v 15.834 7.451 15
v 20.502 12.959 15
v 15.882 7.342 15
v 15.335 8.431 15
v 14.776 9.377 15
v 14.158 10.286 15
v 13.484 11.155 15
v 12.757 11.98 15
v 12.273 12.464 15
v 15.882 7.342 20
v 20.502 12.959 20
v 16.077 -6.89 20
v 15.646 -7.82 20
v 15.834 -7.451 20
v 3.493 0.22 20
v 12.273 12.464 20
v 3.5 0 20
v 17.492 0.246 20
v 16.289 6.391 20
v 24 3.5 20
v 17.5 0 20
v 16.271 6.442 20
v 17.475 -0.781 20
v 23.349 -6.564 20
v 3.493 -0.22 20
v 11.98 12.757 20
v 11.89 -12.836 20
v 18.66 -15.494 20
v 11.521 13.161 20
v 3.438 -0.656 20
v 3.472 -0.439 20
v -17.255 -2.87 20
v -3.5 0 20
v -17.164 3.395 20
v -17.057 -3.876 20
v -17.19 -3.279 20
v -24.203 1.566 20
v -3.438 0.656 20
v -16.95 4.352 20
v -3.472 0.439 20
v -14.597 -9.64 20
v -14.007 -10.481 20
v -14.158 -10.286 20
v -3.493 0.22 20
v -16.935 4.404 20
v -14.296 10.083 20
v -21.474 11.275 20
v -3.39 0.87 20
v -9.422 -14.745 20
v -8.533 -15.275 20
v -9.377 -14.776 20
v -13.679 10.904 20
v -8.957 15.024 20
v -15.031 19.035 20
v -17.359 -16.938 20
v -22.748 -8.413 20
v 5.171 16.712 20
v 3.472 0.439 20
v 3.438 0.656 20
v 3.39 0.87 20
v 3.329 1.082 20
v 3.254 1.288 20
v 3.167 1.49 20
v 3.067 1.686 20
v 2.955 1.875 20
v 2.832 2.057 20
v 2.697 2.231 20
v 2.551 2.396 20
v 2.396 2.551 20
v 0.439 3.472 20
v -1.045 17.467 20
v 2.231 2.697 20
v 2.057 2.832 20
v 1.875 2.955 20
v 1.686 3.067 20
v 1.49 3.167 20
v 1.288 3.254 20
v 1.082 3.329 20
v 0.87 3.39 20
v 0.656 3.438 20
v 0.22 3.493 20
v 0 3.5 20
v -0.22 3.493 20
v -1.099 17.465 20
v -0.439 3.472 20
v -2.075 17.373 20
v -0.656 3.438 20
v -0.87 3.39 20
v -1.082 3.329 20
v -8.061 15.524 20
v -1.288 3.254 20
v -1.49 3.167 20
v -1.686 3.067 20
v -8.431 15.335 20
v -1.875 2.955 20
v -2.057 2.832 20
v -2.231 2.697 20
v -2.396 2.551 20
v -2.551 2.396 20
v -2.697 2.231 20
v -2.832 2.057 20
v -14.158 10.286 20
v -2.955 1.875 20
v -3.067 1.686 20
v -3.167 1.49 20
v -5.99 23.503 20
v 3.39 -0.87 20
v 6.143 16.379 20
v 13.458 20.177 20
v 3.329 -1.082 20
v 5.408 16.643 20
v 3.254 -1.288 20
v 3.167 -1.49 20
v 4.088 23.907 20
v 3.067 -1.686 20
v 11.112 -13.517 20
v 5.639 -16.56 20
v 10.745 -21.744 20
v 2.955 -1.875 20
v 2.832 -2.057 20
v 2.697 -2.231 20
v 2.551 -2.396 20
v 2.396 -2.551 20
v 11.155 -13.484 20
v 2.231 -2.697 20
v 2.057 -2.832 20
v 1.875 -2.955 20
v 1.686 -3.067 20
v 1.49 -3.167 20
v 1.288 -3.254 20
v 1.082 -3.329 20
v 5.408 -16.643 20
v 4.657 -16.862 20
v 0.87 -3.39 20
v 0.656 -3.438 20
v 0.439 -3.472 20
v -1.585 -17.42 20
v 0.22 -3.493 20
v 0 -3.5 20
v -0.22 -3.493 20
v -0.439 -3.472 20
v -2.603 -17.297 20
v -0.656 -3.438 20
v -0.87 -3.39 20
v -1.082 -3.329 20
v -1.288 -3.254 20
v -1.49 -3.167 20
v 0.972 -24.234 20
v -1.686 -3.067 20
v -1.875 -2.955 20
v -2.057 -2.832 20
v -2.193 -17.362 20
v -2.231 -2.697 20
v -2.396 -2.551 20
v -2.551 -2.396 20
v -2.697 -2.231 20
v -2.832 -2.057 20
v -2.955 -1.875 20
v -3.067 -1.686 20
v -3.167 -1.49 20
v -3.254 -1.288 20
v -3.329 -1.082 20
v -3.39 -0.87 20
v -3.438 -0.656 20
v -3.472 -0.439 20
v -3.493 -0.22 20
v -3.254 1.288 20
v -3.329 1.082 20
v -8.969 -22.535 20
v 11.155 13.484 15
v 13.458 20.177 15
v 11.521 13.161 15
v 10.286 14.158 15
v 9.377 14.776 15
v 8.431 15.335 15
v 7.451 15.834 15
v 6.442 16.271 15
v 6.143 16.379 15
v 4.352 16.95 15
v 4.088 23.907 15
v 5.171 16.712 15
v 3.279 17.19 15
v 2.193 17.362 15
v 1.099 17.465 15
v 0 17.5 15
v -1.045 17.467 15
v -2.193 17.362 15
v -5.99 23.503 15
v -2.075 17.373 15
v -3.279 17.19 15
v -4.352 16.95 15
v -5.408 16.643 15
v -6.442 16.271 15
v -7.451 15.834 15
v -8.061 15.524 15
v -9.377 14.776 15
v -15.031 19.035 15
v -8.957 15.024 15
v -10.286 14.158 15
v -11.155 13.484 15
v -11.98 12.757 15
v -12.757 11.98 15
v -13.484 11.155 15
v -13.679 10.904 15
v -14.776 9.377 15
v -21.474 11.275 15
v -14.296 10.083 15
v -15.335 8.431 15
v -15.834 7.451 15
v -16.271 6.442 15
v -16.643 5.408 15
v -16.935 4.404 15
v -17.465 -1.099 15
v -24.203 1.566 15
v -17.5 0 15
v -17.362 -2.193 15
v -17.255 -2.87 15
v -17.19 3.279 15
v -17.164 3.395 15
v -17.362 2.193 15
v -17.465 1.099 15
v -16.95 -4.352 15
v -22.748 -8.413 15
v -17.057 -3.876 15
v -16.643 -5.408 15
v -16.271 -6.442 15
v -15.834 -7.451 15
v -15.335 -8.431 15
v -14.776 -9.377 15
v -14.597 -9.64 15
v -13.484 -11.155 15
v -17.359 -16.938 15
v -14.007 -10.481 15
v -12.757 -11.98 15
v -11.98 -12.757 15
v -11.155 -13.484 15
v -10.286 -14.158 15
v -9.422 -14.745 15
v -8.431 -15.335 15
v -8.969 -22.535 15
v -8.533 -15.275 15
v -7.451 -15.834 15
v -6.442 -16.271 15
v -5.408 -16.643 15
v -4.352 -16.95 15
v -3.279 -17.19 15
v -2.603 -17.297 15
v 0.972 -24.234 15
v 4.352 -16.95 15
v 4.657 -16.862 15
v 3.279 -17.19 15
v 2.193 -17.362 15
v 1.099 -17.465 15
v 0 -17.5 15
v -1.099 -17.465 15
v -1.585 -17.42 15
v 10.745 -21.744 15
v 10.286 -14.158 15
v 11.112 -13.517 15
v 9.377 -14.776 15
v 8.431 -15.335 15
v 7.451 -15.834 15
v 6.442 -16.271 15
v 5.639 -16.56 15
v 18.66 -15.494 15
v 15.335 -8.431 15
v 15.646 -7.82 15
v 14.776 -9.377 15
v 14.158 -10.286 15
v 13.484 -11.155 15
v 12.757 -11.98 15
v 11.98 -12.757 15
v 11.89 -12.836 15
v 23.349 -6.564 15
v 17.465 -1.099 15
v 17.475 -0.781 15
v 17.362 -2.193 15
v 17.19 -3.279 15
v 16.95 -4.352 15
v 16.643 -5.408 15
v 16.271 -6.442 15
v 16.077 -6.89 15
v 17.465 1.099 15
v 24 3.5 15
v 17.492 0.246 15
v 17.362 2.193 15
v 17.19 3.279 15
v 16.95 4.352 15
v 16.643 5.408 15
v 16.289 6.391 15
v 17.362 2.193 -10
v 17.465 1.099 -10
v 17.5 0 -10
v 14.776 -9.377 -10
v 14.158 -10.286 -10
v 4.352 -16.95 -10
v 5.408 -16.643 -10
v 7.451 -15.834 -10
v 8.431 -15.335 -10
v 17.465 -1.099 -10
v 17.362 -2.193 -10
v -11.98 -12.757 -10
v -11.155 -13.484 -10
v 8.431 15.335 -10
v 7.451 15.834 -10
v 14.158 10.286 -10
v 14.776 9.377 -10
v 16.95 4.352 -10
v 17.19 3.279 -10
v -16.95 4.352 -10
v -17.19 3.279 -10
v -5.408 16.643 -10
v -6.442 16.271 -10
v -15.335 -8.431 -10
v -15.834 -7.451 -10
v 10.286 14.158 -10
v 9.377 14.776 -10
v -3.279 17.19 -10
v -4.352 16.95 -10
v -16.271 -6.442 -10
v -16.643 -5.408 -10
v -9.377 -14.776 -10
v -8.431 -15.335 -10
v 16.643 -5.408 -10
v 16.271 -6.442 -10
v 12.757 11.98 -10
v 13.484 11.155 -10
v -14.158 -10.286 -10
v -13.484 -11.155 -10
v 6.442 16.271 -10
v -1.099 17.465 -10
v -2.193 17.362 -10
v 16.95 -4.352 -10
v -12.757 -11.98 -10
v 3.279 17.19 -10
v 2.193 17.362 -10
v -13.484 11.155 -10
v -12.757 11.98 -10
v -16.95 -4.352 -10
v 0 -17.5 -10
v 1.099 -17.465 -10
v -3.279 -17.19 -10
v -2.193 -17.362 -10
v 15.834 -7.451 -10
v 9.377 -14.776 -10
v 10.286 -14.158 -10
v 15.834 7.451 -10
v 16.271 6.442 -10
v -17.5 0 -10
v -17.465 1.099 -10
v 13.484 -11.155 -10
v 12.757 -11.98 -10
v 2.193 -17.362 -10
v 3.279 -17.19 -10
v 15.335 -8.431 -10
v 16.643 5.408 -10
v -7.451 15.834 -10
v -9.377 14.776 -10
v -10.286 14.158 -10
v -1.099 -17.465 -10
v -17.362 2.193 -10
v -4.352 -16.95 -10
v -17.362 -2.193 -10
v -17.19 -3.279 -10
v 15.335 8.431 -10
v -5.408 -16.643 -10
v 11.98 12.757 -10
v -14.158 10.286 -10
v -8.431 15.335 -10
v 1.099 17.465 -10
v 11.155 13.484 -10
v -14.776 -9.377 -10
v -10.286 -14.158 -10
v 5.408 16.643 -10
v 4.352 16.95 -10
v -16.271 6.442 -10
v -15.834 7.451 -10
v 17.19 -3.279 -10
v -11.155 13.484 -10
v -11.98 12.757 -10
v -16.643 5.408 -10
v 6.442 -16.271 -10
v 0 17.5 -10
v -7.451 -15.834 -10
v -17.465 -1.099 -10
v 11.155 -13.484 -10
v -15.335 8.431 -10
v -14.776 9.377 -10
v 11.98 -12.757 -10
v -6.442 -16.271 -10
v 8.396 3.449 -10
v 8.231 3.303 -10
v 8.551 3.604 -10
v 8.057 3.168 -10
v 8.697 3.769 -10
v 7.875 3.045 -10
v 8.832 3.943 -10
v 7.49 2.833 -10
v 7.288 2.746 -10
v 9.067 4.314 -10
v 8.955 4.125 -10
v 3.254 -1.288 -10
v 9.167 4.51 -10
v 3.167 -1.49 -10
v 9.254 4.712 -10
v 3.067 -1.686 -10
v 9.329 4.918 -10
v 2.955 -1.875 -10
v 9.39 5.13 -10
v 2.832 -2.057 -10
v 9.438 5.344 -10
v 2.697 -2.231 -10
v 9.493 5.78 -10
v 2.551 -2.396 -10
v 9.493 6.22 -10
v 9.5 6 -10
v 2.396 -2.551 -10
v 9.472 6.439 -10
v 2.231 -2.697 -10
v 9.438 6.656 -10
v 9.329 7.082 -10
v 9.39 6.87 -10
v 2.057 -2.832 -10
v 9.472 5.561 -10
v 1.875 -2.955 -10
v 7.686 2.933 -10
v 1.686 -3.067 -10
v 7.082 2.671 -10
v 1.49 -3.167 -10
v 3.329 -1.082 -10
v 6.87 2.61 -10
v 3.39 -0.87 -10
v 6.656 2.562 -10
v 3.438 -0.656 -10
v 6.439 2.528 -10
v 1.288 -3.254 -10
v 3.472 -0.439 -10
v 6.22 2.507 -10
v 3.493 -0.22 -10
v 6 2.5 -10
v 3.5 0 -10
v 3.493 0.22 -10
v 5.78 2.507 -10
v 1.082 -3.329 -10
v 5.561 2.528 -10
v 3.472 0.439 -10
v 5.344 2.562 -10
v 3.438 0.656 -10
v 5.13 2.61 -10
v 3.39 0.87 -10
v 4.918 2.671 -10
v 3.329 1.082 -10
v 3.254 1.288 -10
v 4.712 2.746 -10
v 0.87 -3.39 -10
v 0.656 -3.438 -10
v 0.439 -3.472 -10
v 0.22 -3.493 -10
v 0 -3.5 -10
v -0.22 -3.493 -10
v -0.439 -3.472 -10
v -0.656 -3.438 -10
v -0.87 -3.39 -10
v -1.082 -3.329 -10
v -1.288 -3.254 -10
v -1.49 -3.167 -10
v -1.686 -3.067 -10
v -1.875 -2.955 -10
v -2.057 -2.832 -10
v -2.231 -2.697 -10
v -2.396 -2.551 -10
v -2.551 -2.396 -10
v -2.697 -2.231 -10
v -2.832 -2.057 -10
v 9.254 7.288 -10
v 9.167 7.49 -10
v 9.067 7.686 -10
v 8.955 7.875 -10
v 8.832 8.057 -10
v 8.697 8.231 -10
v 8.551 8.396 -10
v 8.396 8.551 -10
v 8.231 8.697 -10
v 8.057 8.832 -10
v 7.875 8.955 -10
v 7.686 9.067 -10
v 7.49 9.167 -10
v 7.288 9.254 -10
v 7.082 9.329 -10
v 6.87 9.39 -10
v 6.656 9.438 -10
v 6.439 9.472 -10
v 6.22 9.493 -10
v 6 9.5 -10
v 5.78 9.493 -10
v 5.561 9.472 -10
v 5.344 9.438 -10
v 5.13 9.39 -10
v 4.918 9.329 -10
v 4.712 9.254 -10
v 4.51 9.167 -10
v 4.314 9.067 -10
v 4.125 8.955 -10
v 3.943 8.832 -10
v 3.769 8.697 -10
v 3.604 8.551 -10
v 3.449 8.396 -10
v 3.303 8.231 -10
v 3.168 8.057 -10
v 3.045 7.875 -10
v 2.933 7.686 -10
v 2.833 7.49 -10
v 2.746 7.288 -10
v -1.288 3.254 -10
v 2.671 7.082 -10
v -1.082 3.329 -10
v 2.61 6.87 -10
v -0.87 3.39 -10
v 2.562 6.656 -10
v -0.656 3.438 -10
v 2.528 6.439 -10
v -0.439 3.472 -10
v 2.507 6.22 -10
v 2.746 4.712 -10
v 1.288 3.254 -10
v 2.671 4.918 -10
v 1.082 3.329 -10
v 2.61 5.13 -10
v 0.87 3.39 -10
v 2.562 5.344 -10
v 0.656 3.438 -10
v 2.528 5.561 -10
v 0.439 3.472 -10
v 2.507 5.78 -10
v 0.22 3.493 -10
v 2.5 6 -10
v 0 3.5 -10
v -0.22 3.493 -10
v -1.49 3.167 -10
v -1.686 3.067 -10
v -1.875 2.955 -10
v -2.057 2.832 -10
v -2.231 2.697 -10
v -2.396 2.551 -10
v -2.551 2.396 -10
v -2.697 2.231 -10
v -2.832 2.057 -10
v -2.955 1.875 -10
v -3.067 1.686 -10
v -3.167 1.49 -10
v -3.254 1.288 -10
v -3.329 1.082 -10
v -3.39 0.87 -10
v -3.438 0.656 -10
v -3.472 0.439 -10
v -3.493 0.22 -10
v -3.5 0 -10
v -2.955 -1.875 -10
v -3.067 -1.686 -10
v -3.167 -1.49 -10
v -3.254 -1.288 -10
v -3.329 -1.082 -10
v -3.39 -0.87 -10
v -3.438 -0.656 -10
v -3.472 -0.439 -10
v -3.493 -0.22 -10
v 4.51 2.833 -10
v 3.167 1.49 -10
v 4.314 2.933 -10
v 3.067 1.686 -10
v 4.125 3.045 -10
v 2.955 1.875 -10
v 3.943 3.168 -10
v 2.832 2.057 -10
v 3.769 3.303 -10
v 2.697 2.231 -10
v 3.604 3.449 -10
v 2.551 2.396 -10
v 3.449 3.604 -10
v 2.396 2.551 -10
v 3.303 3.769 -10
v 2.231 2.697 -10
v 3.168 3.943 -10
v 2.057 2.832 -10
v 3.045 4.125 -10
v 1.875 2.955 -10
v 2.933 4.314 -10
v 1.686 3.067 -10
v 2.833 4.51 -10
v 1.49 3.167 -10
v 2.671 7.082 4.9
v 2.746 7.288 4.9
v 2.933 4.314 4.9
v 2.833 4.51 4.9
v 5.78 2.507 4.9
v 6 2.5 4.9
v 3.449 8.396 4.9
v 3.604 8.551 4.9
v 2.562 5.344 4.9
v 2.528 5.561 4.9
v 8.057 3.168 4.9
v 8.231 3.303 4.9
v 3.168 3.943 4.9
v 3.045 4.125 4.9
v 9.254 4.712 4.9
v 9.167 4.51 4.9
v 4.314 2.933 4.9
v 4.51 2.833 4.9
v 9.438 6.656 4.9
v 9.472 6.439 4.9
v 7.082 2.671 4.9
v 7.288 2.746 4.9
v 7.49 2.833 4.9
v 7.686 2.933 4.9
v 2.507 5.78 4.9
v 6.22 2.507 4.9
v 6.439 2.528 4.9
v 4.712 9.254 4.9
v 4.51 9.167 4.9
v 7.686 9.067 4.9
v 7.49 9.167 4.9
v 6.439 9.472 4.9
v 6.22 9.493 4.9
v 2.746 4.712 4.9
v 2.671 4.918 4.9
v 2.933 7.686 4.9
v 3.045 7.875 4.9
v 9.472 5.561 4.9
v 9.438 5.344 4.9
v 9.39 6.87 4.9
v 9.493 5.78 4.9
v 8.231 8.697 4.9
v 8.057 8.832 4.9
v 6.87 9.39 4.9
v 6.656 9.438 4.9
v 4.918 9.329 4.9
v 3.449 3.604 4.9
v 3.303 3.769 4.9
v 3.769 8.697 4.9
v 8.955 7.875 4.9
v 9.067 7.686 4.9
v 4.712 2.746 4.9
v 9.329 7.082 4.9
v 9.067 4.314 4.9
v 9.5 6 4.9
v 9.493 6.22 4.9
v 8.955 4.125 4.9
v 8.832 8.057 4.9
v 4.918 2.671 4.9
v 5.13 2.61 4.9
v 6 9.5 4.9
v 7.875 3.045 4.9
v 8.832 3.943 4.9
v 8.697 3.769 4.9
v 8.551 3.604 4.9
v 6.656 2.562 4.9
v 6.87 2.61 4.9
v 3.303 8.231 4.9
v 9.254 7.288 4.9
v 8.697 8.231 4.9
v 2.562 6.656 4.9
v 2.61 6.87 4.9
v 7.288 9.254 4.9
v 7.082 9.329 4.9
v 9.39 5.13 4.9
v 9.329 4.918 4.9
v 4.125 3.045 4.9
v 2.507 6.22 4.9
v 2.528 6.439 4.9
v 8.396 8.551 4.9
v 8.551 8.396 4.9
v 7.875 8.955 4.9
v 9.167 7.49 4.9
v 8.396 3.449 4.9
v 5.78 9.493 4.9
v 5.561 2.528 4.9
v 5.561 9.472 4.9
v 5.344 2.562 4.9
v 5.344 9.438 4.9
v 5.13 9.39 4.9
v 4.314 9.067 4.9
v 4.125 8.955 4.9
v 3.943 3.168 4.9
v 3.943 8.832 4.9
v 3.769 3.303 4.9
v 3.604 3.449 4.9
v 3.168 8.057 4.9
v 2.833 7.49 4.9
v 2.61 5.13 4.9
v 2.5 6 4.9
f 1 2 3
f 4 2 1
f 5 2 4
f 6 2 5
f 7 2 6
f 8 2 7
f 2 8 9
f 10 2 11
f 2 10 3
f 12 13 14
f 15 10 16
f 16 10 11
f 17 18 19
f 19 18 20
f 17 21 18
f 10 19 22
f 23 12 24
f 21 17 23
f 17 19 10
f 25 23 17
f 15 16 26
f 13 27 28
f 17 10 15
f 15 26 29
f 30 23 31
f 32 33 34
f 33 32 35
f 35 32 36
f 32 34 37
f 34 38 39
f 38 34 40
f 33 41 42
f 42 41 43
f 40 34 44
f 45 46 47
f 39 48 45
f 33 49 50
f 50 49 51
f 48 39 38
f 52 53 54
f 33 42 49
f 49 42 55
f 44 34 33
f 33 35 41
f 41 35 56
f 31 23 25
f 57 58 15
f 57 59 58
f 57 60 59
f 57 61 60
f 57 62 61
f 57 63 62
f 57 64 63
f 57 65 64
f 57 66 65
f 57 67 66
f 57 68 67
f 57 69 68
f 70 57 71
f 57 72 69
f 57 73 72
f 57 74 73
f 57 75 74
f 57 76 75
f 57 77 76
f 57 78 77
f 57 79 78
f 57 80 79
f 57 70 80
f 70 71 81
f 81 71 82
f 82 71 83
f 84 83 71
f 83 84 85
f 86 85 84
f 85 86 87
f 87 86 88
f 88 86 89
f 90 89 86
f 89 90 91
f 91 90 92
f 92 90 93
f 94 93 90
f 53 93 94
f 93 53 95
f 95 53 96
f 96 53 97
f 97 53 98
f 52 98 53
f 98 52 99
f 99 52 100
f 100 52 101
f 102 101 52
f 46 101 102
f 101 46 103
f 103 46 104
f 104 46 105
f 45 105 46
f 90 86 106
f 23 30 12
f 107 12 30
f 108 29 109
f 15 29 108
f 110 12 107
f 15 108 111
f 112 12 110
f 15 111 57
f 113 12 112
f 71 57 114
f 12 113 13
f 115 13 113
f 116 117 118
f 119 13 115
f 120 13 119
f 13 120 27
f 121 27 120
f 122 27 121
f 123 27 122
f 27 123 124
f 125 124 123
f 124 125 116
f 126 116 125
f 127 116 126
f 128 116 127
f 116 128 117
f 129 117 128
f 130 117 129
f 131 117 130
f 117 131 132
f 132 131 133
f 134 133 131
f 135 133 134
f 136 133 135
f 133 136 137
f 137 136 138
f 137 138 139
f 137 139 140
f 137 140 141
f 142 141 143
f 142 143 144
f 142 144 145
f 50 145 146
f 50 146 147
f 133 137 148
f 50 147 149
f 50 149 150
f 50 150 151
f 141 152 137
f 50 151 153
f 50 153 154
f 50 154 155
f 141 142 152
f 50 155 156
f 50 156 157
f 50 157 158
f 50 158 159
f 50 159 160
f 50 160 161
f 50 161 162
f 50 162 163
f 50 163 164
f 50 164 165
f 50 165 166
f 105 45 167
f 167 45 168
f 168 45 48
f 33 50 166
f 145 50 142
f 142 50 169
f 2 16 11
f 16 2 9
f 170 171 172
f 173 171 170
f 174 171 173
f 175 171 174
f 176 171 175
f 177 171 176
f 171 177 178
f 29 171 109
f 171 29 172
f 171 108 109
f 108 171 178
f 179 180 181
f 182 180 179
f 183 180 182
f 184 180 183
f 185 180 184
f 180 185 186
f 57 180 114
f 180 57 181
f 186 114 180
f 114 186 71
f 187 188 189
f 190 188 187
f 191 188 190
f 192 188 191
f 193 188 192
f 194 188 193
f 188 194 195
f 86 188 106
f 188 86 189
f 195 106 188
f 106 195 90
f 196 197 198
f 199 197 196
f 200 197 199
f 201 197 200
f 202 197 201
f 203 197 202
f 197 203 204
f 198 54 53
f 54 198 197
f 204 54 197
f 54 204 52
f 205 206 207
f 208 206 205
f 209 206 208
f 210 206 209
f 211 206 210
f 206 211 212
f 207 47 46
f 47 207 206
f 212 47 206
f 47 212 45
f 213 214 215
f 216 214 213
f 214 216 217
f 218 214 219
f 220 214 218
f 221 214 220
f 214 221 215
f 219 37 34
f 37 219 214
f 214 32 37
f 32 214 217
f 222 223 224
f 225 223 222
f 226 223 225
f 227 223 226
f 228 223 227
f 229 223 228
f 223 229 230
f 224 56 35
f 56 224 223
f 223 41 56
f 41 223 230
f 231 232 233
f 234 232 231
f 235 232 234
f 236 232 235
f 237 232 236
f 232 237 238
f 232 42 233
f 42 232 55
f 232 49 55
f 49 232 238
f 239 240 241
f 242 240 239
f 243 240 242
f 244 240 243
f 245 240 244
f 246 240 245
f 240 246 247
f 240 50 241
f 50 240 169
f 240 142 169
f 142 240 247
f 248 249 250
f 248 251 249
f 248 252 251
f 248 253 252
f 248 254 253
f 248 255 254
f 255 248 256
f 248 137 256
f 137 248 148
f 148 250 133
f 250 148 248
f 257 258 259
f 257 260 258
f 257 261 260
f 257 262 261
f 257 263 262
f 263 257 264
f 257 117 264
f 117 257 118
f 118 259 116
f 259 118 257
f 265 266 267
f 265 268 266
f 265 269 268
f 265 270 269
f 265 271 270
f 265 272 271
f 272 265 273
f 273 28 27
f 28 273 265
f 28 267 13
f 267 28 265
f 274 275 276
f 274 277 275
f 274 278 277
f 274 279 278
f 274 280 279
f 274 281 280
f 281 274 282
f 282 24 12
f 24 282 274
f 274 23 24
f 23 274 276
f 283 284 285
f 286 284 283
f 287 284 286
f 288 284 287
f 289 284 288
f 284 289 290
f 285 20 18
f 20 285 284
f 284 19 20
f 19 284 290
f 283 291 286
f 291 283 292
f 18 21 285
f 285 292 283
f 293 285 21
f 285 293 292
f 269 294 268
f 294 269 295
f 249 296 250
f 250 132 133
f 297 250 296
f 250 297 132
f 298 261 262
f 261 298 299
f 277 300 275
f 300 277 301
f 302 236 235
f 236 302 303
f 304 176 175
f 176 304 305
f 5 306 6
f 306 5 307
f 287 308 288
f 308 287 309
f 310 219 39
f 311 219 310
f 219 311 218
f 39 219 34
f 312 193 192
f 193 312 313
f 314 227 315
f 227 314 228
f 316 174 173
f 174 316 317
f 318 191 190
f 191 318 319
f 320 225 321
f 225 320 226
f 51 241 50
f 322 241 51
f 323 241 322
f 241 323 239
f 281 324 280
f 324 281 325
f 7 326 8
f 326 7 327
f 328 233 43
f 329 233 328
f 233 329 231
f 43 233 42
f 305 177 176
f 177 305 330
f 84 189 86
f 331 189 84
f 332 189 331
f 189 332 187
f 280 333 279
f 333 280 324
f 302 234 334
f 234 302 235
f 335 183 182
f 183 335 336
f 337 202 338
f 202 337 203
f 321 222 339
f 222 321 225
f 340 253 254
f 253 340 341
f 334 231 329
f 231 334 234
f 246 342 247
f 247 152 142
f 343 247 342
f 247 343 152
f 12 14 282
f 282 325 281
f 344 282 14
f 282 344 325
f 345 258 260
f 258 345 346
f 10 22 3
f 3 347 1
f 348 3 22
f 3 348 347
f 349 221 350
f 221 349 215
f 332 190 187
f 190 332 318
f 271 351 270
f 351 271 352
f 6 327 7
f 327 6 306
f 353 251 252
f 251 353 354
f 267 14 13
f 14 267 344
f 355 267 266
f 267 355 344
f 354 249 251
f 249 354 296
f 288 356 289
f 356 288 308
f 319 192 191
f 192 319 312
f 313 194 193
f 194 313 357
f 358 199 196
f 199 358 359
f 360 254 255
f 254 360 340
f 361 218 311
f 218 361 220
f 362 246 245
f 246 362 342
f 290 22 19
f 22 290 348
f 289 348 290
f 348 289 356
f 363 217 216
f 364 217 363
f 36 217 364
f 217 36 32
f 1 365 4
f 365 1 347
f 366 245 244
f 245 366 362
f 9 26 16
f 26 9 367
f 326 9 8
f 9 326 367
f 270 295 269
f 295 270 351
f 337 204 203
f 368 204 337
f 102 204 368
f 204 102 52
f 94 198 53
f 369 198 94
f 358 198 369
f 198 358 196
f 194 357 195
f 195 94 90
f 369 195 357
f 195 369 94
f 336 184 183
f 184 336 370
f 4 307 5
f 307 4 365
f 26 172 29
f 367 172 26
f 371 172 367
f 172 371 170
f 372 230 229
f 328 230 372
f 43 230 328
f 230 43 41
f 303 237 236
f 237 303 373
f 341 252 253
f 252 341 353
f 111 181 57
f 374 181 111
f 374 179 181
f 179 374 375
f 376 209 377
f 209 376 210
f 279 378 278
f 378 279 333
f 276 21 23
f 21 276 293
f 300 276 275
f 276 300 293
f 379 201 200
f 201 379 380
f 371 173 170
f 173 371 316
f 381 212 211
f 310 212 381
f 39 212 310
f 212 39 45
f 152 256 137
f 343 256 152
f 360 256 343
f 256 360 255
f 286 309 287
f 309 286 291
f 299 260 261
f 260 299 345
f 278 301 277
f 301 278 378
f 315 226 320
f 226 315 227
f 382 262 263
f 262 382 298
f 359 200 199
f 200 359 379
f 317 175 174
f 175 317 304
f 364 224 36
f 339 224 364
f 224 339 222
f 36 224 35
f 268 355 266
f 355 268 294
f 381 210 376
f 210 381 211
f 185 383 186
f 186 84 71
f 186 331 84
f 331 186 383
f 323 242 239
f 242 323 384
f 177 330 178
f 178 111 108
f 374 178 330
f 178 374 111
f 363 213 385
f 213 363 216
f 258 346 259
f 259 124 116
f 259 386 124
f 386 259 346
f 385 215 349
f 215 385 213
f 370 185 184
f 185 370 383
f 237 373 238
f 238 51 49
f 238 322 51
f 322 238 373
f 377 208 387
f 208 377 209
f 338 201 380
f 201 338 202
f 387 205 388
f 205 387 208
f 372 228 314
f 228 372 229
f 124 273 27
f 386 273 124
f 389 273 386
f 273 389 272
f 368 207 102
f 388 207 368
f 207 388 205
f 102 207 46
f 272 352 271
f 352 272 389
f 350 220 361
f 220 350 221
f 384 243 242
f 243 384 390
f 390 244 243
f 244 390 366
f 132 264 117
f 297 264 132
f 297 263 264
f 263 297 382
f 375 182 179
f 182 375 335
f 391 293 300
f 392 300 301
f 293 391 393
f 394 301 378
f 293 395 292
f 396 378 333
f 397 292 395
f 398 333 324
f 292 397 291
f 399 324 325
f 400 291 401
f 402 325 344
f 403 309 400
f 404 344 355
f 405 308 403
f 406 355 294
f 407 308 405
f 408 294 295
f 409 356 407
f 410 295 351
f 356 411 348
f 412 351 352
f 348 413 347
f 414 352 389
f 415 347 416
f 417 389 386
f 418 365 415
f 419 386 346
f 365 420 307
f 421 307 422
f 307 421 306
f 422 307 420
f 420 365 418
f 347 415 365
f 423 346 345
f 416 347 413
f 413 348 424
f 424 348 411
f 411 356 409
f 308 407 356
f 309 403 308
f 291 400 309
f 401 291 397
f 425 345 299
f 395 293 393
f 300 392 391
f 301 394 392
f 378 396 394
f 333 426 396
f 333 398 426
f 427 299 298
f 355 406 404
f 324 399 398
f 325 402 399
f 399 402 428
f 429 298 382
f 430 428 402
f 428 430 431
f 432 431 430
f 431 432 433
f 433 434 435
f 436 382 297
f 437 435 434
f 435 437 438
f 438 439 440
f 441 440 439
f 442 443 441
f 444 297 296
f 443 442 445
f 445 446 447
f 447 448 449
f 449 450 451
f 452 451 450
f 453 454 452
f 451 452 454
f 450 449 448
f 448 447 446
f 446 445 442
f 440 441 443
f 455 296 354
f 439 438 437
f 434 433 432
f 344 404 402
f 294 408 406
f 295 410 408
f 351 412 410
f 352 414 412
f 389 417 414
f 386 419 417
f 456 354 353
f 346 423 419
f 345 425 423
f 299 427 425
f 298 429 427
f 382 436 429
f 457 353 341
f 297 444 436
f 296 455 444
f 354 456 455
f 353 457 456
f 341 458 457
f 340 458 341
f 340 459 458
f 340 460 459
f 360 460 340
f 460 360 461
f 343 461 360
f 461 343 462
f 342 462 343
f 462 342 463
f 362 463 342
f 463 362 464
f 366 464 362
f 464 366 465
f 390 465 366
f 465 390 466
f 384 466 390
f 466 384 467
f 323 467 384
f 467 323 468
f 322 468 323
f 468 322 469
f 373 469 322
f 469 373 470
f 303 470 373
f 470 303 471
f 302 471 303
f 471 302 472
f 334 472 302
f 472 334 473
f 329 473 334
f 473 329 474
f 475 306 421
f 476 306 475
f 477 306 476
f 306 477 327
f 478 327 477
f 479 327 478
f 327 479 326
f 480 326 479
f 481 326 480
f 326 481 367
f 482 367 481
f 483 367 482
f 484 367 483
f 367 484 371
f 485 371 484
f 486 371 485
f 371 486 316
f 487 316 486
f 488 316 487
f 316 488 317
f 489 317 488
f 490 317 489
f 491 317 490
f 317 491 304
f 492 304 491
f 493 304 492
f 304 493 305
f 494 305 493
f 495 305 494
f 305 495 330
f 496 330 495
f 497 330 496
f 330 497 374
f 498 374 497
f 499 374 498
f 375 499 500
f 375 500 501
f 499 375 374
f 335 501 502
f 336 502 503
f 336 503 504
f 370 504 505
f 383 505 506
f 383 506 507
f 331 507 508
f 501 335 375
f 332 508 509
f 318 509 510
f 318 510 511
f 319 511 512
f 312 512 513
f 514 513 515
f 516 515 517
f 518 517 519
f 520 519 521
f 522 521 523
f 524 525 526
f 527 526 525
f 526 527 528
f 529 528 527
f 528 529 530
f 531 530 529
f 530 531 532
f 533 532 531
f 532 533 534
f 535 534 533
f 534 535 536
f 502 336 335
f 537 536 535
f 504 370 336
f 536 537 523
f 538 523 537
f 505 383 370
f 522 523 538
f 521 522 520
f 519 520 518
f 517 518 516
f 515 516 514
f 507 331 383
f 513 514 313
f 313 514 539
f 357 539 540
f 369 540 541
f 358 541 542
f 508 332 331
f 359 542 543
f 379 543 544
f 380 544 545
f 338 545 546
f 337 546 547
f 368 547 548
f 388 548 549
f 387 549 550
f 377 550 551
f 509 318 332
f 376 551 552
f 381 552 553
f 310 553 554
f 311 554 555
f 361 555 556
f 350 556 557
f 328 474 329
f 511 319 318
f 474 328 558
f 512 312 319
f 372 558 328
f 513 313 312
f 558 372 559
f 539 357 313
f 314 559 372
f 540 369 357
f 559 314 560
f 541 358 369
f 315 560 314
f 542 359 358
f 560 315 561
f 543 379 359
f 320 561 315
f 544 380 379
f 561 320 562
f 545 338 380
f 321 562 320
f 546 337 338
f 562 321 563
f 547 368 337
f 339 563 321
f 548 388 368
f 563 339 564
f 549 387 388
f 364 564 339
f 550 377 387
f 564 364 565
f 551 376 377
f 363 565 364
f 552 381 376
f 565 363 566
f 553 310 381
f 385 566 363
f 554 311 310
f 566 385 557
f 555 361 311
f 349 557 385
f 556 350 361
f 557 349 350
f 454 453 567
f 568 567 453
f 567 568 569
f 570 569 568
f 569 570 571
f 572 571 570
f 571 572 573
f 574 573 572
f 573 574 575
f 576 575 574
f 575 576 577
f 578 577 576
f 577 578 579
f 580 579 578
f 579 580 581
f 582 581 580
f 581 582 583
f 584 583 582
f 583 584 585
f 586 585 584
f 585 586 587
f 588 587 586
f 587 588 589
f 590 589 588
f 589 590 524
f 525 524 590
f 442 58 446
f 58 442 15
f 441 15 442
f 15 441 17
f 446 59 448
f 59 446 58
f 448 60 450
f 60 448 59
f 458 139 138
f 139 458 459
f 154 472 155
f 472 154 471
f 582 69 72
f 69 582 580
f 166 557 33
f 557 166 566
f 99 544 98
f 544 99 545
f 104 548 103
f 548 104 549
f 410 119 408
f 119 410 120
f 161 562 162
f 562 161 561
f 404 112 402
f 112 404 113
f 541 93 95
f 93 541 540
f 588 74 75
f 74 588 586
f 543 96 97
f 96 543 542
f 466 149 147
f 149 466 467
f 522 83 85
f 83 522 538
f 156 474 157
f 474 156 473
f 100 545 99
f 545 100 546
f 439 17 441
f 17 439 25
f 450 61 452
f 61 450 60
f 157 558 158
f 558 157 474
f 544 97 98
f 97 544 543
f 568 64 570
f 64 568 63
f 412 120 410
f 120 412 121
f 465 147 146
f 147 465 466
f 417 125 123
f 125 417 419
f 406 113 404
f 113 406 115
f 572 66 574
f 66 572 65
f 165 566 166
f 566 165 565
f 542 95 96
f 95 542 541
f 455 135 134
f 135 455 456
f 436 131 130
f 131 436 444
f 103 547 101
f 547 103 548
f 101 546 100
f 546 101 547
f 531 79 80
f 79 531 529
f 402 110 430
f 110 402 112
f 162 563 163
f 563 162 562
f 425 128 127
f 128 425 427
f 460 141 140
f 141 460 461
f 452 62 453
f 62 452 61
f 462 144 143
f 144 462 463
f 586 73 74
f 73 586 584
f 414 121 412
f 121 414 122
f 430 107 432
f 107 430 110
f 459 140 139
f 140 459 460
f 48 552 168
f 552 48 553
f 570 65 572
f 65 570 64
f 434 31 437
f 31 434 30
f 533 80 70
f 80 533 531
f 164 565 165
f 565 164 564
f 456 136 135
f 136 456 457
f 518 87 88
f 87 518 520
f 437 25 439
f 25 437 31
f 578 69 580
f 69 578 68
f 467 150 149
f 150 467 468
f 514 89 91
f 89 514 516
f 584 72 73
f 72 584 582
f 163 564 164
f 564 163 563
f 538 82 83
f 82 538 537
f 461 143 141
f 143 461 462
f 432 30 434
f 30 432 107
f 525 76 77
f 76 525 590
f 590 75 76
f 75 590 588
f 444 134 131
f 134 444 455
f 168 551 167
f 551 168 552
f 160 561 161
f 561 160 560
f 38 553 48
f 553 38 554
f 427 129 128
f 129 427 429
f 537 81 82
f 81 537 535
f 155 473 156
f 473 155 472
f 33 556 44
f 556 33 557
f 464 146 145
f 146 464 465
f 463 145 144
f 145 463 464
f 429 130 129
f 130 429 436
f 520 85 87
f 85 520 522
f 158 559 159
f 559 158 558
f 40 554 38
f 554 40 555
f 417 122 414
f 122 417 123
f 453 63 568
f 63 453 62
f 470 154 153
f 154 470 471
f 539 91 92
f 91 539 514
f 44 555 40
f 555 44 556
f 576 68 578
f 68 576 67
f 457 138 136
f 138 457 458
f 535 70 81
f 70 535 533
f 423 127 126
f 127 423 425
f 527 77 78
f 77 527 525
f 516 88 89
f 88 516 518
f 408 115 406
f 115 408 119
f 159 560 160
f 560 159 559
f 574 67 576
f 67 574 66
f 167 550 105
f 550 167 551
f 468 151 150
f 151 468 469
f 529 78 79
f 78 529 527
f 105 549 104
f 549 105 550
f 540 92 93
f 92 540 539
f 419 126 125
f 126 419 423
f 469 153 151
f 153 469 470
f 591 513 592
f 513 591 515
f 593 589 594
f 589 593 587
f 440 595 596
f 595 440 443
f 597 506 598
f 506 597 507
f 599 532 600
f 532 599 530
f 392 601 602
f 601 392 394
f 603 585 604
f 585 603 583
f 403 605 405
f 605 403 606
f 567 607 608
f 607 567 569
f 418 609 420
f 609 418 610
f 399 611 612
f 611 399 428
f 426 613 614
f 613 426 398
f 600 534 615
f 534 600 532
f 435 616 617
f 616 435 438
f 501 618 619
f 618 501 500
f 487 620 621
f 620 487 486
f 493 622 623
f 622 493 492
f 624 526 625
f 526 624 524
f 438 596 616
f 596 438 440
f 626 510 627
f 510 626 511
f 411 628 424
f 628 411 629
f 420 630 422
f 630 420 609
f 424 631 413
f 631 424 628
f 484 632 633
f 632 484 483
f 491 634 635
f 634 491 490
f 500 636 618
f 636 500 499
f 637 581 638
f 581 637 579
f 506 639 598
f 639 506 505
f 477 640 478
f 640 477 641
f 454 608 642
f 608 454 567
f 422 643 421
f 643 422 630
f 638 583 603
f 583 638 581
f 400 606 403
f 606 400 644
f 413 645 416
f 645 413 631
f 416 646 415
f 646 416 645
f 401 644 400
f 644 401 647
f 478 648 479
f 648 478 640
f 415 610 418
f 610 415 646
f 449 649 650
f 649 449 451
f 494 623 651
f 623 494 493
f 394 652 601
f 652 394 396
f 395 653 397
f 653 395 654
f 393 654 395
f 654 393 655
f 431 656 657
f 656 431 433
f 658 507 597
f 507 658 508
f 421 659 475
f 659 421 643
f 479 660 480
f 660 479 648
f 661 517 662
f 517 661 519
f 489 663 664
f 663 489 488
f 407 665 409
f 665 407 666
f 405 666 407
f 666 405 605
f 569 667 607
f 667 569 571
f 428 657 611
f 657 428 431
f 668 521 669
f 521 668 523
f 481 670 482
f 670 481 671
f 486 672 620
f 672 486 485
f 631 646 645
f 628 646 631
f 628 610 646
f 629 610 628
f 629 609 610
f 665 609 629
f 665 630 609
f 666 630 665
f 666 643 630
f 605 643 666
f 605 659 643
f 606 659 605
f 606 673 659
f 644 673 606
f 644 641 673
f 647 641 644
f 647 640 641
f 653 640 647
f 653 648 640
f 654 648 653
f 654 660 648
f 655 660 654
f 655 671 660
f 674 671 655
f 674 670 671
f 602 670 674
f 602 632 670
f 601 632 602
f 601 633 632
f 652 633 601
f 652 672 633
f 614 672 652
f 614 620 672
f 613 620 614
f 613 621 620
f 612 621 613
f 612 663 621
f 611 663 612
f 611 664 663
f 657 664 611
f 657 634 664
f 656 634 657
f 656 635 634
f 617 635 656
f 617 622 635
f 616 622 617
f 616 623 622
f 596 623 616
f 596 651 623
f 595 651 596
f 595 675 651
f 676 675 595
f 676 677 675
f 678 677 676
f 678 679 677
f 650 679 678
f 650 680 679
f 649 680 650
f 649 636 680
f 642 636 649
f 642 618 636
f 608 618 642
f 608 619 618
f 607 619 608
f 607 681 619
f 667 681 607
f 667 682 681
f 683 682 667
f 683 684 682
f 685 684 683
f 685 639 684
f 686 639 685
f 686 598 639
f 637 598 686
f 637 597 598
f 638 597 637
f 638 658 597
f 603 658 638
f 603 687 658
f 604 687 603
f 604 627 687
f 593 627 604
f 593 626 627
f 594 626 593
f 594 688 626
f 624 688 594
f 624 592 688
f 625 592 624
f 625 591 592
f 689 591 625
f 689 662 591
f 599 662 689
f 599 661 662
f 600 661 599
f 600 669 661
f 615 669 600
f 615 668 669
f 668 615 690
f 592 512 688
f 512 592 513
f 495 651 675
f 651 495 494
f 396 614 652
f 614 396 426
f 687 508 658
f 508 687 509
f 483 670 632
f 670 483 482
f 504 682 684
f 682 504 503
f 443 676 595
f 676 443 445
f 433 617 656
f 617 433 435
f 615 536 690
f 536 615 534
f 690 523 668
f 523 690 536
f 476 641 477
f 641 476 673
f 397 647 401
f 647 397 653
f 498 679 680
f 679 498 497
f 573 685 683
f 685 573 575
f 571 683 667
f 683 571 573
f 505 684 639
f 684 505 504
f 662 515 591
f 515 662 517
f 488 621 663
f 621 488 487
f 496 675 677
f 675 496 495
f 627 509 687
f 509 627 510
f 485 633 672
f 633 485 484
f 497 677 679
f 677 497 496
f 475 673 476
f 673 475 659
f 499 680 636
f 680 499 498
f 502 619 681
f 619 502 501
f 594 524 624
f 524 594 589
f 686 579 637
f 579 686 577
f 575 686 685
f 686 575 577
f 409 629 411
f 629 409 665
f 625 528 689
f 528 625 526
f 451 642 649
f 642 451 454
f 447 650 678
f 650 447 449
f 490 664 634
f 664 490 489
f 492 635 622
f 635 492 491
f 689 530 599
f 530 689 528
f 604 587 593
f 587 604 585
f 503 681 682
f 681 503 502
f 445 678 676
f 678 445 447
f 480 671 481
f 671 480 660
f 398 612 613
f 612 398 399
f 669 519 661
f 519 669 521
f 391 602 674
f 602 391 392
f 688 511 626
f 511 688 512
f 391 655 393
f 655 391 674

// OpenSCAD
$fn=100;
difference(){
		union()
		{
		cylinder(20,d=35);
		for(i=[1:1:15]){
			rotate([0,0,360/15*i]) translate([17,0,15]) 
				linear_extrude(5)
					polygon([[0,0],[-5,8],[7,3.5]]);
		}

		cylinder(20,d=35,center=true);
		}
	translate([0,0,-10.1]) cylinder(30.2,d=7);
	translate([6,6,-10.1]) cylinder(15,d=7);
	}
